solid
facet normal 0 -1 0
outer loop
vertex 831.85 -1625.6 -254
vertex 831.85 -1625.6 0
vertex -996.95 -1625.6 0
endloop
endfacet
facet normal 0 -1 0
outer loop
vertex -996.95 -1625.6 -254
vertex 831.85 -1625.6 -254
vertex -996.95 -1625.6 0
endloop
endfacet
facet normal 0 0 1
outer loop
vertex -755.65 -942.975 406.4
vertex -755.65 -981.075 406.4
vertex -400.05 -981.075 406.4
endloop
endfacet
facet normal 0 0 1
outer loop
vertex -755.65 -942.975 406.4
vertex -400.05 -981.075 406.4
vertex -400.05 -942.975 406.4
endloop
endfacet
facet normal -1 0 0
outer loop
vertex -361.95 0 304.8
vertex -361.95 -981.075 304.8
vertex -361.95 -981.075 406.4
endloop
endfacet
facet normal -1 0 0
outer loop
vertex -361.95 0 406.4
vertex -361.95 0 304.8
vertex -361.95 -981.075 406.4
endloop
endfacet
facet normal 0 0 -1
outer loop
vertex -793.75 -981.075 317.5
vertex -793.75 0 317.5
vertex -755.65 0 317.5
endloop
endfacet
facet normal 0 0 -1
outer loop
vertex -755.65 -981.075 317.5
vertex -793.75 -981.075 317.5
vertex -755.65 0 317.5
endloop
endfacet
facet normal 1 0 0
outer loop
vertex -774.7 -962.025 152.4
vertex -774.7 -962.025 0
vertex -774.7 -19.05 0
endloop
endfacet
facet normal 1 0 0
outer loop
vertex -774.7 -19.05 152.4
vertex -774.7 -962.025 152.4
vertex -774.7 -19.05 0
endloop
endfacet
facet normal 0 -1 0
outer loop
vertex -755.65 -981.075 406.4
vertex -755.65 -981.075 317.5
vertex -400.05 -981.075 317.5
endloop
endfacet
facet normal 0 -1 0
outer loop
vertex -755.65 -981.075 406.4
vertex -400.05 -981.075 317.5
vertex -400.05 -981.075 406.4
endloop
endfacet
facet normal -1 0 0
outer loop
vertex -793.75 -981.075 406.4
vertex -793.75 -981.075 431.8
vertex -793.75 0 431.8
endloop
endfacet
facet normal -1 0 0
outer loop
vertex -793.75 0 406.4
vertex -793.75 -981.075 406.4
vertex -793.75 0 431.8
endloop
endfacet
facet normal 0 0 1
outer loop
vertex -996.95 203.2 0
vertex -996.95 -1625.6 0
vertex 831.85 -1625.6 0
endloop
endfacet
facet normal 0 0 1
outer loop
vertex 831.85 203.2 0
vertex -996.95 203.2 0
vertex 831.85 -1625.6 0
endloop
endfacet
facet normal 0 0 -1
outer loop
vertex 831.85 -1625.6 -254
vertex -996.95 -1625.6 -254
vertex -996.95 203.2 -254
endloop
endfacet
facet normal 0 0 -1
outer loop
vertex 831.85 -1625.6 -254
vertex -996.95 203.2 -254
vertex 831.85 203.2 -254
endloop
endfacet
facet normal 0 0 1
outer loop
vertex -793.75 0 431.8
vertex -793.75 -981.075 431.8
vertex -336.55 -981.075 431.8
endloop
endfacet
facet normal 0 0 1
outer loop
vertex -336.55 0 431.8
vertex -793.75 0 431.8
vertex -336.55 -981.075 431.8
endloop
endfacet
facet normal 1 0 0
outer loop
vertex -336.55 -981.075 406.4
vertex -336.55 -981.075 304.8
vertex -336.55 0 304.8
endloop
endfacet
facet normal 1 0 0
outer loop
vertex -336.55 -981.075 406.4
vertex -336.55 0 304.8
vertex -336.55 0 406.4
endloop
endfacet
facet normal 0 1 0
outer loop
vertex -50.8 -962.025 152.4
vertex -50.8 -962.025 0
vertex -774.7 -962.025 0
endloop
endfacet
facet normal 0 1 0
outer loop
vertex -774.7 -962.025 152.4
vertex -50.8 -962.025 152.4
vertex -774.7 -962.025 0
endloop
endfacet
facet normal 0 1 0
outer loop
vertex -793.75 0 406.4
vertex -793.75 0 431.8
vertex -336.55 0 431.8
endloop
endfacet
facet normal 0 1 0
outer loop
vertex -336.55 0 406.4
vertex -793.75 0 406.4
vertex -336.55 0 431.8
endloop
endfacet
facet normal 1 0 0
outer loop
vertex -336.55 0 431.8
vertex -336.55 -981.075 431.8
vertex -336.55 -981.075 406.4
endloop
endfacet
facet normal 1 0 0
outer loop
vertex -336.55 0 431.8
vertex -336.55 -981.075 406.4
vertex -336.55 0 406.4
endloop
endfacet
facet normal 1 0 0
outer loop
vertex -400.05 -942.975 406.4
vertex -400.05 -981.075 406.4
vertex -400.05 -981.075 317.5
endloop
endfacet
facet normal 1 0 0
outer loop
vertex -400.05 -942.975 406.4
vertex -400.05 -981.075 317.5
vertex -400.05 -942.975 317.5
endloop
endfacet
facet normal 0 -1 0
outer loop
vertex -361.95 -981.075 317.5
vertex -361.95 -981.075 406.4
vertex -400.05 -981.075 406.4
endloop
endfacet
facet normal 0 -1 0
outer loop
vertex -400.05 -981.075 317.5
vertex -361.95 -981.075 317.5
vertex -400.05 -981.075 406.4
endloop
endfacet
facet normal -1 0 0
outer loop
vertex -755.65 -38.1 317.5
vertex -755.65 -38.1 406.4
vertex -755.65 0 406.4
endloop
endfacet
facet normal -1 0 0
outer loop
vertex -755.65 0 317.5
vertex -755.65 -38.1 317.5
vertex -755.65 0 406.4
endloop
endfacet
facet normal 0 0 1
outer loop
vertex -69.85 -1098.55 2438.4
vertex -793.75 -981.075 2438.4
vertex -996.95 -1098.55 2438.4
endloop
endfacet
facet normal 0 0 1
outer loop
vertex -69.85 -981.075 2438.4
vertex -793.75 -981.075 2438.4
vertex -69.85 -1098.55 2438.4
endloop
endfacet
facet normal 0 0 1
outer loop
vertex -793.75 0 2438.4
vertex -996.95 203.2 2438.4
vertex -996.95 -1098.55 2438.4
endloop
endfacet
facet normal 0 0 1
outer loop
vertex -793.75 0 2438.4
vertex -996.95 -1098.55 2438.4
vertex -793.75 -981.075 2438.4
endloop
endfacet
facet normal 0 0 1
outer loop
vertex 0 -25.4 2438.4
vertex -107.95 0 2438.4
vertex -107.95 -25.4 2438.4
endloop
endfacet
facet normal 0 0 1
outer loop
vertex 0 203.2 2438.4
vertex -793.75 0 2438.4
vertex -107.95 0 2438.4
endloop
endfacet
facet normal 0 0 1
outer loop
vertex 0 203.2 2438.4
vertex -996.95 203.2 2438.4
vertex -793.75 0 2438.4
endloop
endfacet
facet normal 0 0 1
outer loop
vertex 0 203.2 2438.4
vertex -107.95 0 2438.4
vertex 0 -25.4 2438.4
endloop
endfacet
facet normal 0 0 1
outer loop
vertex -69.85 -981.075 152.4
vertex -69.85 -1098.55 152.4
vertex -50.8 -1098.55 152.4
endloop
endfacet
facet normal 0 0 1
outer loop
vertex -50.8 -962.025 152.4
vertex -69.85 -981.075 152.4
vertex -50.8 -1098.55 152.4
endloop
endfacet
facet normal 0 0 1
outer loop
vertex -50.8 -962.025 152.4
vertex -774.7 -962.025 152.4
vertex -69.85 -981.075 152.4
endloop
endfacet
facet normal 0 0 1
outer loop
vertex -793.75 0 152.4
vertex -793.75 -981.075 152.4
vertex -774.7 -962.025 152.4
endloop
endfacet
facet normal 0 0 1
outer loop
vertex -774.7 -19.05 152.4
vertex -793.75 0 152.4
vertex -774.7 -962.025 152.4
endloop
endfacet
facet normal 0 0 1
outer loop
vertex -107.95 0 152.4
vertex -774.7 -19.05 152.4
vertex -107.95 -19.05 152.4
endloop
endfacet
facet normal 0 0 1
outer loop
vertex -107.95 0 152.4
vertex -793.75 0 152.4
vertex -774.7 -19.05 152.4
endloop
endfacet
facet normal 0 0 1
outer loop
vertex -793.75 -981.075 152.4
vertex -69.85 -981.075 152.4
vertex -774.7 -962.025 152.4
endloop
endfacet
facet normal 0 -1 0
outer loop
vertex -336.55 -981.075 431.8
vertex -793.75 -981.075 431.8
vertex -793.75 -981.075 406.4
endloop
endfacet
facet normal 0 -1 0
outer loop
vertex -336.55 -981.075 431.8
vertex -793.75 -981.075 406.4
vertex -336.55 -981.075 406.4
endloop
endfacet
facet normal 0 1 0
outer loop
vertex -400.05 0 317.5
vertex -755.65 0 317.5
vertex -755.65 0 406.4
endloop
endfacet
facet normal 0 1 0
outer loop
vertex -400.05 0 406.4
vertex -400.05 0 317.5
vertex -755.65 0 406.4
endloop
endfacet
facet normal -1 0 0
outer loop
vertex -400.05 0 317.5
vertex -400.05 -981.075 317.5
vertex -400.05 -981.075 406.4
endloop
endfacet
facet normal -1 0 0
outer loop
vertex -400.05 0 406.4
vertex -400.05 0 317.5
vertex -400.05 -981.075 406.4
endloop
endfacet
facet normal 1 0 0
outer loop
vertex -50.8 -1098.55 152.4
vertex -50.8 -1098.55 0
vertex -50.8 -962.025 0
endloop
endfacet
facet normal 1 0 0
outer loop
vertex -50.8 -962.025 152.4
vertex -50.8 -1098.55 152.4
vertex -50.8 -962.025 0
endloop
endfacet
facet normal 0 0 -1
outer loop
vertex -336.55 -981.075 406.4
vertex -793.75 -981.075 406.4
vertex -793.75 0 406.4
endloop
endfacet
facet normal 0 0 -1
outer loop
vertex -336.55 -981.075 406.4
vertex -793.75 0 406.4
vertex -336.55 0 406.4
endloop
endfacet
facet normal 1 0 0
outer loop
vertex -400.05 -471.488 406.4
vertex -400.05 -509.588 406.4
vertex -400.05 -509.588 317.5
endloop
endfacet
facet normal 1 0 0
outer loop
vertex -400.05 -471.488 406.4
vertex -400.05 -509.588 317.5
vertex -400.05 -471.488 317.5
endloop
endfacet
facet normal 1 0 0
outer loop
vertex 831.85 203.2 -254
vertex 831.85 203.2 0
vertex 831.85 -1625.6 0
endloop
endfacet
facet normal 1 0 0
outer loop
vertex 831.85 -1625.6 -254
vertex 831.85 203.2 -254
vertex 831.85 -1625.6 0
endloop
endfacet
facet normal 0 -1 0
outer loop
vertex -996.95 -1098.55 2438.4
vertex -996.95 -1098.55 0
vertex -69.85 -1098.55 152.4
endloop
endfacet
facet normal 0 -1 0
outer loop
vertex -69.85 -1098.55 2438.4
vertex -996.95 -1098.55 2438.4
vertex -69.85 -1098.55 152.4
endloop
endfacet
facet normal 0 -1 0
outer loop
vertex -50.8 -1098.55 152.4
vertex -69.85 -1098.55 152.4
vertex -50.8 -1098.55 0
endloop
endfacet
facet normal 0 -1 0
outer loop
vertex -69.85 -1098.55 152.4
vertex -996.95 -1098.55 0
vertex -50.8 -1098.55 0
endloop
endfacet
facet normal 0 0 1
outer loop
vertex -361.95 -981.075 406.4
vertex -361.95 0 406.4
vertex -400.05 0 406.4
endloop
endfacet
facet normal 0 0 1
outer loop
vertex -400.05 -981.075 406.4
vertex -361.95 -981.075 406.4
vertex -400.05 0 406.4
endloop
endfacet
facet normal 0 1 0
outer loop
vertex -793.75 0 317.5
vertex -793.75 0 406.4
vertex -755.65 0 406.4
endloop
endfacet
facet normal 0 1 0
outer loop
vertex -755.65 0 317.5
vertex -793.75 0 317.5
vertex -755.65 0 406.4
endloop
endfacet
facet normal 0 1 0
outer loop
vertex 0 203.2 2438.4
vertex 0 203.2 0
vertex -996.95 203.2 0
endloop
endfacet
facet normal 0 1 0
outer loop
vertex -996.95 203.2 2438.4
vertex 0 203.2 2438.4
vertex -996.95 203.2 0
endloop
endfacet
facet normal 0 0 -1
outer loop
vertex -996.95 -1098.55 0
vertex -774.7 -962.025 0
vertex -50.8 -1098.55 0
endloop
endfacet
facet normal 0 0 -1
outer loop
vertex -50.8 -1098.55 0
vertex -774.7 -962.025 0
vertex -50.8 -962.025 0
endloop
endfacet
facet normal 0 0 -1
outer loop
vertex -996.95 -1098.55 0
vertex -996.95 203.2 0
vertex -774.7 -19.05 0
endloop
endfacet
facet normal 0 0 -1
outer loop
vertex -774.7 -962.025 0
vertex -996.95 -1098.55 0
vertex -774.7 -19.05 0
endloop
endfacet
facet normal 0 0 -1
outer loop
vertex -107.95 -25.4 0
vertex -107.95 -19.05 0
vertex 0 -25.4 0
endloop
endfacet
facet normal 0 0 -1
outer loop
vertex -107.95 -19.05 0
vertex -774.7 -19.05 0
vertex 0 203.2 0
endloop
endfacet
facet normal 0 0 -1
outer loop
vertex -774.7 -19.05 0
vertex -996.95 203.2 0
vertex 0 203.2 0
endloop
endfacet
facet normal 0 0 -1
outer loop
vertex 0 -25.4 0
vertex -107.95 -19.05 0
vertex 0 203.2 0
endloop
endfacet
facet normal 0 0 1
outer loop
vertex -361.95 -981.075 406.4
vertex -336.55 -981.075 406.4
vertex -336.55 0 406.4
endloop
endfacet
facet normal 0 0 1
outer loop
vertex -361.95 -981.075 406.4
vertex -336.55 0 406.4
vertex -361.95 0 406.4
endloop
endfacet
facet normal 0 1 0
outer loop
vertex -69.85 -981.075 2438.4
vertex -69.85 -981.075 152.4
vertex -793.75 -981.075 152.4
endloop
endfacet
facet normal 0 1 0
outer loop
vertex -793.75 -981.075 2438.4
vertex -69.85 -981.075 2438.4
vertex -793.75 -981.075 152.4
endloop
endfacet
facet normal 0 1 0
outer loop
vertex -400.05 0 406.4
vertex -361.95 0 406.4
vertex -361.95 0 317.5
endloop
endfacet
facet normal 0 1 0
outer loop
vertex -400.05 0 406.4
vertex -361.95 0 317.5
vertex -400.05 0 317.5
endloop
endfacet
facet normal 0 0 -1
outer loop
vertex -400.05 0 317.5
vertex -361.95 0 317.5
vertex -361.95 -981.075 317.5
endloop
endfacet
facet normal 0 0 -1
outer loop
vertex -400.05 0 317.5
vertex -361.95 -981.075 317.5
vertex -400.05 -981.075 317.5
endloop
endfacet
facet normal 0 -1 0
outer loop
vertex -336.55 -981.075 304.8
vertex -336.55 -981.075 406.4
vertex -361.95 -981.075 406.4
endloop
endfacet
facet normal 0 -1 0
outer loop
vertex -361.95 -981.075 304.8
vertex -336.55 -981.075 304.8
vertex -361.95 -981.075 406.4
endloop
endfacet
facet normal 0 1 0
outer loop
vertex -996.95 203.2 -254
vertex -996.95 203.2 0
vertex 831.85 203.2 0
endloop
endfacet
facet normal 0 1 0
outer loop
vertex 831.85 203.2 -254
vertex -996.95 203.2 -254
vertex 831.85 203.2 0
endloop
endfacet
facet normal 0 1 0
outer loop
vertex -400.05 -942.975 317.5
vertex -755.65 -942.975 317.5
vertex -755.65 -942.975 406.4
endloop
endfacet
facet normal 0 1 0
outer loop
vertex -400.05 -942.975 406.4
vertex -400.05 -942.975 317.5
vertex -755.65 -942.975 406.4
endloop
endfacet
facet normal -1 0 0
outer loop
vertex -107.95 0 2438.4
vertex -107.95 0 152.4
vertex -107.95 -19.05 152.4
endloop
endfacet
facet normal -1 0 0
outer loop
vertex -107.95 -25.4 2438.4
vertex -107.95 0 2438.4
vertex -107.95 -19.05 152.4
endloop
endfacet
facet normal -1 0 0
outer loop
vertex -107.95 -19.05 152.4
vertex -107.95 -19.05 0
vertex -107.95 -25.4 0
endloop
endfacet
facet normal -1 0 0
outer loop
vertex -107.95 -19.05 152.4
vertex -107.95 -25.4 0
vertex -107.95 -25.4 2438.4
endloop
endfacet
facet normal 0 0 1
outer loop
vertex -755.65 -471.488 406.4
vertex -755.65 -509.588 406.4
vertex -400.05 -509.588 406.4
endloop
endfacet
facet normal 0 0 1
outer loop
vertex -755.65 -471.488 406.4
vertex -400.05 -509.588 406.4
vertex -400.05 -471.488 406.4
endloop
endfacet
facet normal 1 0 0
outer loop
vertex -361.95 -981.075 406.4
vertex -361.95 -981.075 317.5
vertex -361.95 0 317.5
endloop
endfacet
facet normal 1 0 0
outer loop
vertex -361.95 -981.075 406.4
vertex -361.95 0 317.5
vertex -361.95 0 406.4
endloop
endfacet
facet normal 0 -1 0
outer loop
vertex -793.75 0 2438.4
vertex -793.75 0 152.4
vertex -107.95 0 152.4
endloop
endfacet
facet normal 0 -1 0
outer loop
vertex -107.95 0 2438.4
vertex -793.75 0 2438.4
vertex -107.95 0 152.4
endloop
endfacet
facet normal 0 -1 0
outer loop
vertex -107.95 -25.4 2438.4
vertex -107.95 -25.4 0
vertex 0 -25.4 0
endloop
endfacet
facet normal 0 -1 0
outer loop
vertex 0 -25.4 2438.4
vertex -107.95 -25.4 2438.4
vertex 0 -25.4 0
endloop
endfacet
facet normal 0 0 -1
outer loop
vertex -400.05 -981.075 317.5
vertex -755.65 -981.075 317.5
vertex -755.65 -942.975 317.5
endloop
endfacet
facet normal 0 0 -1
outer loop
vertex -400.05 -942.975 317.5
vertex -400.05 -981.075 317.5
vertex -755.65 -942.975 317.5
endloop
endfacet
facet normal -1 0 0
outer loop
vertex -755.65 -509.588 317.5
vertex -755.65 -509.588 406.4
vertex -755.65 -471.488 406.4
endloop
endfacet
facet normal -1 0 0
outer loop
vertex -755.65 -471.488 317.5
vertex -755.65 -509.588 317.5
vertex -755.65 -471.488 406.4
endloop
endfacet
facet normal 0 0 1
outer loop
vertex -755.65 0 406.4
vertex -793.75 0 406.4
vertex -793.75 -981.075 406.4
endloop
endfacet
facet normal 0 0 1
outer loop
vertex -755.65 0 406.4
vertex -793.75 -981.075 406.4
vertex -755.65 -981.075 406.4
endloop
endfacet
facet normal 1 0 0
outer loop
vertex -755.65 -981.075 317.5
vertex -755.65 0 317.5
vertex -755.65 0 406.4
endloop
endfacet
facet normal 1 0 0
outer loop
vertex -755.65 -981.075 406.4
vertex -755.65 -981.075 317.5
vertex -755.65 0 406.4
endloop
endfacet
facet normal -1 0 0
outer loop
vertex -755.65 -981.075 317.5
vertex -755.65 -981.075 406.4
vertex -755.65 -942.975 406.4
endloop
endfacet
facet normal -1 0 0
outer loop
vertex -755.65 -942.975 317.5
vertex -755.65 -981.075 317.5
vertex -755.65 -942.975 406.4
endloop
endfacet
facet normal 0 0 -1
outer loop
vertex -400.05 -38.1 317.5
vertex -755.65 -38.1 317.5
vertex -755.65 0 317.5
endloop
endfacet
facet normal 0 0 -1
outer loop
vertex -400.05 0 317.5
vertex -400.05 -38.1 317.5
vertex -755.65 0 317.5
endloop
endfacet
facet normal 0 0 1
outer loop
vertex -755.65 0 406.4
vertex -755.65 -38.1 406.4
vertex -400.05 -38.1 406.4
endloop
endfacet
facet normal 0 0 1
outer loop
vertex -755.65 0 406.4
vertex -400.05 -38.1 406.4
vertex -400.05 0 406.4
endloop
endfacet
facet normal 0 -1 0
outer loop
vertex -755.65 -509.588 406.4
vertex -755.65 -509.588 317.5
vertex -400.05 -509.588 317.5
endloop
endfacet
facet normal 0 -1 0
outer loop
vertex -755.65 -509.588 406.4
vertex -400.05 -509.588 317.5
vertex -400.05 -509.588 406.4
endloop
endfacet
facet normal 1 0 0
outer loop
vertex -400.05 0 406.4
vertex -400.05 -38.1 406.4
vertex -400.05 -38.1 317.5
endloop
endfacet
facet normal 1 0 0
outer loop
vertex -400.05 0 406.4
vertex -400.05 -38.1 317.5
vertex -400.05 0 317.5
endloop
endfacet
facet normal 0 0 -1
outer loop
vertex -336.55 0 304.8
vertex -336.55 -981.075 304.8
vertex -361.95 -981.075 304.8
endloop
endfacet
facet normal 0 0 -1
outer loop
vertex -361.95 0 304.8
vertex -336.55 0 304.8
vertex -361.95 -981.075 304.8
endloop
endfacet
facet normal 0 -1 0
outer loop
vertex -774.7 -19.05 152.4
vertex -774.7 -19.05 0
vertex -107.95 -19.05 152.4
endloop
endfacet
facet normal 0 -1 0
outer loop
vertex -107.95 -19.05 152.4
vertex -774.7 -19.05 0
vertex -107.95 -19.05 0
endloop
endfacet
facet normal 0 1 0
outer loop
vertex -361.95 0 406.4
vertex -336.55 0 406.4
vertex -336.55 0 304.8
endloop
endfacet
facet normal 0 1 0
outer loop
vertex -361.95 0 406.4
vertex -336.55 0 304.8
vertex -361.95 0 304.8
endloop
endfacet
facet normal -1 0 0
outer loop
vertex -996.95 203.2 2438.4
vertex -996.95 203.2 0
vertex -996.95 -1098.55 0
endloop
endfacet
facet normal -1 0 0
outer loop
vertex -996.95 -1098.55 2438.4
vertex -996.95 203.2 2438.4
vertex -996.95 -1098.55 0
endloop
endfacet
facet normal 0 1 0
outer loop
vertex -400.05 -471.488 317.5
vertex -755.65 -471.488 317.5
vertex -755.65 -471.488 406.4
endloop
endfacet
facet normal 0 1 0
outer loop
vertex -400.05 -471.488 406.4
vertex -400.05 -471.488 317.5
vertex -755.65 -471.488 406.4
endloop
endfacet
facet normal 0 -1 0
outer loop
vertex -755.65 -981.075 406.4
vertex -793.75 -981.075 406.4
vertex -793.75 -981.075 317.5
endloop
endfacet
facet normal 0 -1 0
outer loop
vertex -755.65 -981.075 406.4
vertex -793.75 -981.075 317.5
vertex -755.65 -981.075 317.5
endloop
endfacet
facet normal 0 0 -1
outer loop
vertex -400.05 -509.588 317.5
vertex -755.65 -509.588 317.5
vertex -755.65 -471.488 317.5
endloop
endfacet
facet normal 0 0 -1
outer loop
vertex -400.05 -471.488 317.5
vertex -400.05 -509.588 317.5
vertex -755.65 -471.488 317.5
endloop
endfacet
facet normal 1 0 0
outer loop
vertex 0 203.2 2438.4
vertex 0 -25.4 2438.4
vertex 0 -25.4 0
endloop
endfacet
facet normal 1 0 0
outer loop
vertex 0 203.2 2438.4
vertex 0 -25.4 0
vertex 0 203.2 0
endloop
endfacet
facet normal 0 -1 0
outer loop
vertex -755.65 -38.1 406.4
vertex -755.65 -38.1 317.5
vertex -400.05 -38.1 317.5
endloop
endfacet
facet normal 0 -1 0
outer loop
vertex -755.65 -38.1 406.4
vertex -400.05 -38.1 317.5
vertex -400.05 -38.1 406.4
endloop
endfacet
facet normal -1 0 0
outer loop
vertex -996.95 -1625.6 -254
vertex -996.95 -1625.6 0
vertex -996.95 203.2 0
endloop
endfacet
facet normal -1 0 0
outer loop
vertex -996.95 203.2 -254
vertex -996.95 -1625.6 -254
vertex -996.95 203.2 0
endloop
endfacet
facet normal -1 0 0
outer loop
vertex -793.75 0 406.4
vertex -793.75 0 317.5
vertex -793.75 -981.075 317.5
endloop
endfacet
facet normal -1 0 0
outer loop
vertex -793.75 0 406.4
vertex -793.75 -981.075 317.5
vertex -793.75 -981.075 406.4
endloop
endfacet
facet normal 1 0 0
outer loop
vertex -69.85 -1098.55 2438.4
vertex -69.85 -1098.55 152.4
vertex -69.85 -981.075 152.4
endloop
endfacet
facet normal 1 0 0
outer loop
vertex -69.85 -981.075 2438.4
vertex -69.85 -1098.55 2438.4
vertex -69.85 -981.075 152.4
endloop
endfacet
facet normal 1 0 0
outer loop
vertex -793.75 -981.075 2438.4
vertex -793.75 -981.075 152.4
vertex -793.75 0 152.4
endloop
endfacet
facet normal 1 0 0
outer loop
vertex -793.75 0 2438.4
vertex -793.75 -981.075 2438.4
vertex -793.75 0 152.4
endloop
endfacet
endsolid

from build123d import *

# Parameters (mm, degrees)
F1_DEPTH  = 2438.4
F3_DEPTH  = 254
F5_DEPTH  = 152.4
F7_W      = 457.2
F7_H      = 981.075
F8_DEPTH  = 25.4
F9_W      = 38.1
F9_H      = 88.9
F10_DEPTH = 981.075
F12_W     = 38.1
F12_H     = 88.9
F13_DEPTH = 981.075
F11_W     = 25.4
F11_H     = 101.6
F14_DEPTH = 981.075
F15_W     = 38.1
F15_H     = 88.9
F16_DEPTH = 355.6


with BuildPart() as f1:
    # F0 (on Top) → F1 (new body)
    with BuildSketch(Plane.XY):
        Polygon((-793.75, 0), (-107.95, 0), (-107.95, -25.4), (0, -25.4), (0, 0), (0, 203.2), (-996.95, 203.2), (-996.95, -1098.55), (-69.85, -1098.55), (-69.85, -981.075), (-793.75, -981.075), align=None)
    extrude(amount=F1_DEPTH)

    # F4 (on face) → F5 (join)
    with BuildSketch(Plane.XY):
        Polygon((-793.75, 0), (-793.75, -981.075), (-69.85, -981.075), (-69.85, -1098.55), (-50.8, -1098.55), (-50.8, -962.025), (-774.7, -962.025), (-774.7, -19.05), (-107.95, -19.05), (-107.95, 0), align=None)
    extrude(amount=F5_DEPTH)


with BuildPart() as f3:
    # F2 (on face) → F3 (new body)
    with BuildSketch(Plane(origin=(0, 0, 0), x_dir=(1, 0, 0), z_dir=(0, 0, -1))):
        Polygon((0, 25.4), (0, -203.2), (831.85, -203.2), (831.85, 1625.6), (-996.95, 1625.6), (-996.95, 1098.55), (-69.85, 1098.55), (-69.85, 981.075), (-793.75, 981.075), (-793.75, 0), (-107.95, 0), (-107.95, 25.4), align=None)
        Polygon((-996.95, 1098.55), (-996.95, -203.2), (0, -203.2), (0, 25.4), (-107.95, 25.4), (-107.95, 0), (-793.75, 0), (-793.75, 981.075), (-69.85, 981.075), (-69.85, 1098.55), align=None)
    extrude(amount=F3_DEPTH)


with BuildPart() as f8:
    # F7 (on offset) → F8 (new body)
    with BuildSketch(Plane.XY.offset(431.8)):
        with Locations((-565.15, -490.5375)):
            Rectangle(F7_W, F7_H)
    extrude(amount=-F8_DEPTH)


with BuildPart() as f10:
    # F9 (on face) → F10 (new body, through all)
    with BuildSketch(Plane.XZ):
        with Locations((-774.7, 361.95)):
            Rectangle(F9_W, F9_H)
    extrude(amount=F10_DEPTH)


with BuildPart() as f13:
    # F12 (on face) → F13 (new body, through all)
    with BuildSketch(Plane(origin=(0, -981.075, 0), x_dir=(-1, 0, 0), z_dir=(0, 1, 0))):
        with Locations((381, 361.95)):
            Rectangle(F12_W, F12_H)
    extrude(amount=F13_DEPTH)


with BuildPart() as f14:
    # F11 (on face) → F14 (new body, through all)
    with BuildSketch(Plane(origin=(0, -981.075, 0), x_dir=(-1, 0, 0), z_dir=(0, 1, 0))):
        with Locations((349.25, 355.6)):
            Rectangle(F11_W, F11_H)
    extrude(amount=F14_DEPTH)


with BuildPart() as f16:
    # F15 (on face) → F16 (new body, through all)
    with BuildSketch(Plane.YZ.offset(-755.65)):
        with Locations((-962.025, 361.95)):
            Rectangle(F15_W, F15_H)
    extrude(amount=F16_DEPTH)


with BuildPart() as f16b:
    # F15 (on face) → F16, piece 2 (new body, through all)
    with BuildSketch(Plane.YZ.offset(-755.65)):
        with Locations((-490.5375, 361.95)):
            Rectangle(F15_W, F15_H)
    extrude(amount=F16_DEPTH)


with BuildPart() as f16c:
    # F15 (on face) → F16, piece 3 (new body, through all)
    with BuildSketch(Plane.YZ.offset(-755.65)):
        with Locations((-19.05, 361.95)):
            Rectangle(F15_W, F15_H)
    extrude(amount=F16_DEPTH)


solid = Compound([f1.part, f3.part, f8.part, f10.part, f13.part, f14.part, f16.part, f16b.part, f16c.part])
